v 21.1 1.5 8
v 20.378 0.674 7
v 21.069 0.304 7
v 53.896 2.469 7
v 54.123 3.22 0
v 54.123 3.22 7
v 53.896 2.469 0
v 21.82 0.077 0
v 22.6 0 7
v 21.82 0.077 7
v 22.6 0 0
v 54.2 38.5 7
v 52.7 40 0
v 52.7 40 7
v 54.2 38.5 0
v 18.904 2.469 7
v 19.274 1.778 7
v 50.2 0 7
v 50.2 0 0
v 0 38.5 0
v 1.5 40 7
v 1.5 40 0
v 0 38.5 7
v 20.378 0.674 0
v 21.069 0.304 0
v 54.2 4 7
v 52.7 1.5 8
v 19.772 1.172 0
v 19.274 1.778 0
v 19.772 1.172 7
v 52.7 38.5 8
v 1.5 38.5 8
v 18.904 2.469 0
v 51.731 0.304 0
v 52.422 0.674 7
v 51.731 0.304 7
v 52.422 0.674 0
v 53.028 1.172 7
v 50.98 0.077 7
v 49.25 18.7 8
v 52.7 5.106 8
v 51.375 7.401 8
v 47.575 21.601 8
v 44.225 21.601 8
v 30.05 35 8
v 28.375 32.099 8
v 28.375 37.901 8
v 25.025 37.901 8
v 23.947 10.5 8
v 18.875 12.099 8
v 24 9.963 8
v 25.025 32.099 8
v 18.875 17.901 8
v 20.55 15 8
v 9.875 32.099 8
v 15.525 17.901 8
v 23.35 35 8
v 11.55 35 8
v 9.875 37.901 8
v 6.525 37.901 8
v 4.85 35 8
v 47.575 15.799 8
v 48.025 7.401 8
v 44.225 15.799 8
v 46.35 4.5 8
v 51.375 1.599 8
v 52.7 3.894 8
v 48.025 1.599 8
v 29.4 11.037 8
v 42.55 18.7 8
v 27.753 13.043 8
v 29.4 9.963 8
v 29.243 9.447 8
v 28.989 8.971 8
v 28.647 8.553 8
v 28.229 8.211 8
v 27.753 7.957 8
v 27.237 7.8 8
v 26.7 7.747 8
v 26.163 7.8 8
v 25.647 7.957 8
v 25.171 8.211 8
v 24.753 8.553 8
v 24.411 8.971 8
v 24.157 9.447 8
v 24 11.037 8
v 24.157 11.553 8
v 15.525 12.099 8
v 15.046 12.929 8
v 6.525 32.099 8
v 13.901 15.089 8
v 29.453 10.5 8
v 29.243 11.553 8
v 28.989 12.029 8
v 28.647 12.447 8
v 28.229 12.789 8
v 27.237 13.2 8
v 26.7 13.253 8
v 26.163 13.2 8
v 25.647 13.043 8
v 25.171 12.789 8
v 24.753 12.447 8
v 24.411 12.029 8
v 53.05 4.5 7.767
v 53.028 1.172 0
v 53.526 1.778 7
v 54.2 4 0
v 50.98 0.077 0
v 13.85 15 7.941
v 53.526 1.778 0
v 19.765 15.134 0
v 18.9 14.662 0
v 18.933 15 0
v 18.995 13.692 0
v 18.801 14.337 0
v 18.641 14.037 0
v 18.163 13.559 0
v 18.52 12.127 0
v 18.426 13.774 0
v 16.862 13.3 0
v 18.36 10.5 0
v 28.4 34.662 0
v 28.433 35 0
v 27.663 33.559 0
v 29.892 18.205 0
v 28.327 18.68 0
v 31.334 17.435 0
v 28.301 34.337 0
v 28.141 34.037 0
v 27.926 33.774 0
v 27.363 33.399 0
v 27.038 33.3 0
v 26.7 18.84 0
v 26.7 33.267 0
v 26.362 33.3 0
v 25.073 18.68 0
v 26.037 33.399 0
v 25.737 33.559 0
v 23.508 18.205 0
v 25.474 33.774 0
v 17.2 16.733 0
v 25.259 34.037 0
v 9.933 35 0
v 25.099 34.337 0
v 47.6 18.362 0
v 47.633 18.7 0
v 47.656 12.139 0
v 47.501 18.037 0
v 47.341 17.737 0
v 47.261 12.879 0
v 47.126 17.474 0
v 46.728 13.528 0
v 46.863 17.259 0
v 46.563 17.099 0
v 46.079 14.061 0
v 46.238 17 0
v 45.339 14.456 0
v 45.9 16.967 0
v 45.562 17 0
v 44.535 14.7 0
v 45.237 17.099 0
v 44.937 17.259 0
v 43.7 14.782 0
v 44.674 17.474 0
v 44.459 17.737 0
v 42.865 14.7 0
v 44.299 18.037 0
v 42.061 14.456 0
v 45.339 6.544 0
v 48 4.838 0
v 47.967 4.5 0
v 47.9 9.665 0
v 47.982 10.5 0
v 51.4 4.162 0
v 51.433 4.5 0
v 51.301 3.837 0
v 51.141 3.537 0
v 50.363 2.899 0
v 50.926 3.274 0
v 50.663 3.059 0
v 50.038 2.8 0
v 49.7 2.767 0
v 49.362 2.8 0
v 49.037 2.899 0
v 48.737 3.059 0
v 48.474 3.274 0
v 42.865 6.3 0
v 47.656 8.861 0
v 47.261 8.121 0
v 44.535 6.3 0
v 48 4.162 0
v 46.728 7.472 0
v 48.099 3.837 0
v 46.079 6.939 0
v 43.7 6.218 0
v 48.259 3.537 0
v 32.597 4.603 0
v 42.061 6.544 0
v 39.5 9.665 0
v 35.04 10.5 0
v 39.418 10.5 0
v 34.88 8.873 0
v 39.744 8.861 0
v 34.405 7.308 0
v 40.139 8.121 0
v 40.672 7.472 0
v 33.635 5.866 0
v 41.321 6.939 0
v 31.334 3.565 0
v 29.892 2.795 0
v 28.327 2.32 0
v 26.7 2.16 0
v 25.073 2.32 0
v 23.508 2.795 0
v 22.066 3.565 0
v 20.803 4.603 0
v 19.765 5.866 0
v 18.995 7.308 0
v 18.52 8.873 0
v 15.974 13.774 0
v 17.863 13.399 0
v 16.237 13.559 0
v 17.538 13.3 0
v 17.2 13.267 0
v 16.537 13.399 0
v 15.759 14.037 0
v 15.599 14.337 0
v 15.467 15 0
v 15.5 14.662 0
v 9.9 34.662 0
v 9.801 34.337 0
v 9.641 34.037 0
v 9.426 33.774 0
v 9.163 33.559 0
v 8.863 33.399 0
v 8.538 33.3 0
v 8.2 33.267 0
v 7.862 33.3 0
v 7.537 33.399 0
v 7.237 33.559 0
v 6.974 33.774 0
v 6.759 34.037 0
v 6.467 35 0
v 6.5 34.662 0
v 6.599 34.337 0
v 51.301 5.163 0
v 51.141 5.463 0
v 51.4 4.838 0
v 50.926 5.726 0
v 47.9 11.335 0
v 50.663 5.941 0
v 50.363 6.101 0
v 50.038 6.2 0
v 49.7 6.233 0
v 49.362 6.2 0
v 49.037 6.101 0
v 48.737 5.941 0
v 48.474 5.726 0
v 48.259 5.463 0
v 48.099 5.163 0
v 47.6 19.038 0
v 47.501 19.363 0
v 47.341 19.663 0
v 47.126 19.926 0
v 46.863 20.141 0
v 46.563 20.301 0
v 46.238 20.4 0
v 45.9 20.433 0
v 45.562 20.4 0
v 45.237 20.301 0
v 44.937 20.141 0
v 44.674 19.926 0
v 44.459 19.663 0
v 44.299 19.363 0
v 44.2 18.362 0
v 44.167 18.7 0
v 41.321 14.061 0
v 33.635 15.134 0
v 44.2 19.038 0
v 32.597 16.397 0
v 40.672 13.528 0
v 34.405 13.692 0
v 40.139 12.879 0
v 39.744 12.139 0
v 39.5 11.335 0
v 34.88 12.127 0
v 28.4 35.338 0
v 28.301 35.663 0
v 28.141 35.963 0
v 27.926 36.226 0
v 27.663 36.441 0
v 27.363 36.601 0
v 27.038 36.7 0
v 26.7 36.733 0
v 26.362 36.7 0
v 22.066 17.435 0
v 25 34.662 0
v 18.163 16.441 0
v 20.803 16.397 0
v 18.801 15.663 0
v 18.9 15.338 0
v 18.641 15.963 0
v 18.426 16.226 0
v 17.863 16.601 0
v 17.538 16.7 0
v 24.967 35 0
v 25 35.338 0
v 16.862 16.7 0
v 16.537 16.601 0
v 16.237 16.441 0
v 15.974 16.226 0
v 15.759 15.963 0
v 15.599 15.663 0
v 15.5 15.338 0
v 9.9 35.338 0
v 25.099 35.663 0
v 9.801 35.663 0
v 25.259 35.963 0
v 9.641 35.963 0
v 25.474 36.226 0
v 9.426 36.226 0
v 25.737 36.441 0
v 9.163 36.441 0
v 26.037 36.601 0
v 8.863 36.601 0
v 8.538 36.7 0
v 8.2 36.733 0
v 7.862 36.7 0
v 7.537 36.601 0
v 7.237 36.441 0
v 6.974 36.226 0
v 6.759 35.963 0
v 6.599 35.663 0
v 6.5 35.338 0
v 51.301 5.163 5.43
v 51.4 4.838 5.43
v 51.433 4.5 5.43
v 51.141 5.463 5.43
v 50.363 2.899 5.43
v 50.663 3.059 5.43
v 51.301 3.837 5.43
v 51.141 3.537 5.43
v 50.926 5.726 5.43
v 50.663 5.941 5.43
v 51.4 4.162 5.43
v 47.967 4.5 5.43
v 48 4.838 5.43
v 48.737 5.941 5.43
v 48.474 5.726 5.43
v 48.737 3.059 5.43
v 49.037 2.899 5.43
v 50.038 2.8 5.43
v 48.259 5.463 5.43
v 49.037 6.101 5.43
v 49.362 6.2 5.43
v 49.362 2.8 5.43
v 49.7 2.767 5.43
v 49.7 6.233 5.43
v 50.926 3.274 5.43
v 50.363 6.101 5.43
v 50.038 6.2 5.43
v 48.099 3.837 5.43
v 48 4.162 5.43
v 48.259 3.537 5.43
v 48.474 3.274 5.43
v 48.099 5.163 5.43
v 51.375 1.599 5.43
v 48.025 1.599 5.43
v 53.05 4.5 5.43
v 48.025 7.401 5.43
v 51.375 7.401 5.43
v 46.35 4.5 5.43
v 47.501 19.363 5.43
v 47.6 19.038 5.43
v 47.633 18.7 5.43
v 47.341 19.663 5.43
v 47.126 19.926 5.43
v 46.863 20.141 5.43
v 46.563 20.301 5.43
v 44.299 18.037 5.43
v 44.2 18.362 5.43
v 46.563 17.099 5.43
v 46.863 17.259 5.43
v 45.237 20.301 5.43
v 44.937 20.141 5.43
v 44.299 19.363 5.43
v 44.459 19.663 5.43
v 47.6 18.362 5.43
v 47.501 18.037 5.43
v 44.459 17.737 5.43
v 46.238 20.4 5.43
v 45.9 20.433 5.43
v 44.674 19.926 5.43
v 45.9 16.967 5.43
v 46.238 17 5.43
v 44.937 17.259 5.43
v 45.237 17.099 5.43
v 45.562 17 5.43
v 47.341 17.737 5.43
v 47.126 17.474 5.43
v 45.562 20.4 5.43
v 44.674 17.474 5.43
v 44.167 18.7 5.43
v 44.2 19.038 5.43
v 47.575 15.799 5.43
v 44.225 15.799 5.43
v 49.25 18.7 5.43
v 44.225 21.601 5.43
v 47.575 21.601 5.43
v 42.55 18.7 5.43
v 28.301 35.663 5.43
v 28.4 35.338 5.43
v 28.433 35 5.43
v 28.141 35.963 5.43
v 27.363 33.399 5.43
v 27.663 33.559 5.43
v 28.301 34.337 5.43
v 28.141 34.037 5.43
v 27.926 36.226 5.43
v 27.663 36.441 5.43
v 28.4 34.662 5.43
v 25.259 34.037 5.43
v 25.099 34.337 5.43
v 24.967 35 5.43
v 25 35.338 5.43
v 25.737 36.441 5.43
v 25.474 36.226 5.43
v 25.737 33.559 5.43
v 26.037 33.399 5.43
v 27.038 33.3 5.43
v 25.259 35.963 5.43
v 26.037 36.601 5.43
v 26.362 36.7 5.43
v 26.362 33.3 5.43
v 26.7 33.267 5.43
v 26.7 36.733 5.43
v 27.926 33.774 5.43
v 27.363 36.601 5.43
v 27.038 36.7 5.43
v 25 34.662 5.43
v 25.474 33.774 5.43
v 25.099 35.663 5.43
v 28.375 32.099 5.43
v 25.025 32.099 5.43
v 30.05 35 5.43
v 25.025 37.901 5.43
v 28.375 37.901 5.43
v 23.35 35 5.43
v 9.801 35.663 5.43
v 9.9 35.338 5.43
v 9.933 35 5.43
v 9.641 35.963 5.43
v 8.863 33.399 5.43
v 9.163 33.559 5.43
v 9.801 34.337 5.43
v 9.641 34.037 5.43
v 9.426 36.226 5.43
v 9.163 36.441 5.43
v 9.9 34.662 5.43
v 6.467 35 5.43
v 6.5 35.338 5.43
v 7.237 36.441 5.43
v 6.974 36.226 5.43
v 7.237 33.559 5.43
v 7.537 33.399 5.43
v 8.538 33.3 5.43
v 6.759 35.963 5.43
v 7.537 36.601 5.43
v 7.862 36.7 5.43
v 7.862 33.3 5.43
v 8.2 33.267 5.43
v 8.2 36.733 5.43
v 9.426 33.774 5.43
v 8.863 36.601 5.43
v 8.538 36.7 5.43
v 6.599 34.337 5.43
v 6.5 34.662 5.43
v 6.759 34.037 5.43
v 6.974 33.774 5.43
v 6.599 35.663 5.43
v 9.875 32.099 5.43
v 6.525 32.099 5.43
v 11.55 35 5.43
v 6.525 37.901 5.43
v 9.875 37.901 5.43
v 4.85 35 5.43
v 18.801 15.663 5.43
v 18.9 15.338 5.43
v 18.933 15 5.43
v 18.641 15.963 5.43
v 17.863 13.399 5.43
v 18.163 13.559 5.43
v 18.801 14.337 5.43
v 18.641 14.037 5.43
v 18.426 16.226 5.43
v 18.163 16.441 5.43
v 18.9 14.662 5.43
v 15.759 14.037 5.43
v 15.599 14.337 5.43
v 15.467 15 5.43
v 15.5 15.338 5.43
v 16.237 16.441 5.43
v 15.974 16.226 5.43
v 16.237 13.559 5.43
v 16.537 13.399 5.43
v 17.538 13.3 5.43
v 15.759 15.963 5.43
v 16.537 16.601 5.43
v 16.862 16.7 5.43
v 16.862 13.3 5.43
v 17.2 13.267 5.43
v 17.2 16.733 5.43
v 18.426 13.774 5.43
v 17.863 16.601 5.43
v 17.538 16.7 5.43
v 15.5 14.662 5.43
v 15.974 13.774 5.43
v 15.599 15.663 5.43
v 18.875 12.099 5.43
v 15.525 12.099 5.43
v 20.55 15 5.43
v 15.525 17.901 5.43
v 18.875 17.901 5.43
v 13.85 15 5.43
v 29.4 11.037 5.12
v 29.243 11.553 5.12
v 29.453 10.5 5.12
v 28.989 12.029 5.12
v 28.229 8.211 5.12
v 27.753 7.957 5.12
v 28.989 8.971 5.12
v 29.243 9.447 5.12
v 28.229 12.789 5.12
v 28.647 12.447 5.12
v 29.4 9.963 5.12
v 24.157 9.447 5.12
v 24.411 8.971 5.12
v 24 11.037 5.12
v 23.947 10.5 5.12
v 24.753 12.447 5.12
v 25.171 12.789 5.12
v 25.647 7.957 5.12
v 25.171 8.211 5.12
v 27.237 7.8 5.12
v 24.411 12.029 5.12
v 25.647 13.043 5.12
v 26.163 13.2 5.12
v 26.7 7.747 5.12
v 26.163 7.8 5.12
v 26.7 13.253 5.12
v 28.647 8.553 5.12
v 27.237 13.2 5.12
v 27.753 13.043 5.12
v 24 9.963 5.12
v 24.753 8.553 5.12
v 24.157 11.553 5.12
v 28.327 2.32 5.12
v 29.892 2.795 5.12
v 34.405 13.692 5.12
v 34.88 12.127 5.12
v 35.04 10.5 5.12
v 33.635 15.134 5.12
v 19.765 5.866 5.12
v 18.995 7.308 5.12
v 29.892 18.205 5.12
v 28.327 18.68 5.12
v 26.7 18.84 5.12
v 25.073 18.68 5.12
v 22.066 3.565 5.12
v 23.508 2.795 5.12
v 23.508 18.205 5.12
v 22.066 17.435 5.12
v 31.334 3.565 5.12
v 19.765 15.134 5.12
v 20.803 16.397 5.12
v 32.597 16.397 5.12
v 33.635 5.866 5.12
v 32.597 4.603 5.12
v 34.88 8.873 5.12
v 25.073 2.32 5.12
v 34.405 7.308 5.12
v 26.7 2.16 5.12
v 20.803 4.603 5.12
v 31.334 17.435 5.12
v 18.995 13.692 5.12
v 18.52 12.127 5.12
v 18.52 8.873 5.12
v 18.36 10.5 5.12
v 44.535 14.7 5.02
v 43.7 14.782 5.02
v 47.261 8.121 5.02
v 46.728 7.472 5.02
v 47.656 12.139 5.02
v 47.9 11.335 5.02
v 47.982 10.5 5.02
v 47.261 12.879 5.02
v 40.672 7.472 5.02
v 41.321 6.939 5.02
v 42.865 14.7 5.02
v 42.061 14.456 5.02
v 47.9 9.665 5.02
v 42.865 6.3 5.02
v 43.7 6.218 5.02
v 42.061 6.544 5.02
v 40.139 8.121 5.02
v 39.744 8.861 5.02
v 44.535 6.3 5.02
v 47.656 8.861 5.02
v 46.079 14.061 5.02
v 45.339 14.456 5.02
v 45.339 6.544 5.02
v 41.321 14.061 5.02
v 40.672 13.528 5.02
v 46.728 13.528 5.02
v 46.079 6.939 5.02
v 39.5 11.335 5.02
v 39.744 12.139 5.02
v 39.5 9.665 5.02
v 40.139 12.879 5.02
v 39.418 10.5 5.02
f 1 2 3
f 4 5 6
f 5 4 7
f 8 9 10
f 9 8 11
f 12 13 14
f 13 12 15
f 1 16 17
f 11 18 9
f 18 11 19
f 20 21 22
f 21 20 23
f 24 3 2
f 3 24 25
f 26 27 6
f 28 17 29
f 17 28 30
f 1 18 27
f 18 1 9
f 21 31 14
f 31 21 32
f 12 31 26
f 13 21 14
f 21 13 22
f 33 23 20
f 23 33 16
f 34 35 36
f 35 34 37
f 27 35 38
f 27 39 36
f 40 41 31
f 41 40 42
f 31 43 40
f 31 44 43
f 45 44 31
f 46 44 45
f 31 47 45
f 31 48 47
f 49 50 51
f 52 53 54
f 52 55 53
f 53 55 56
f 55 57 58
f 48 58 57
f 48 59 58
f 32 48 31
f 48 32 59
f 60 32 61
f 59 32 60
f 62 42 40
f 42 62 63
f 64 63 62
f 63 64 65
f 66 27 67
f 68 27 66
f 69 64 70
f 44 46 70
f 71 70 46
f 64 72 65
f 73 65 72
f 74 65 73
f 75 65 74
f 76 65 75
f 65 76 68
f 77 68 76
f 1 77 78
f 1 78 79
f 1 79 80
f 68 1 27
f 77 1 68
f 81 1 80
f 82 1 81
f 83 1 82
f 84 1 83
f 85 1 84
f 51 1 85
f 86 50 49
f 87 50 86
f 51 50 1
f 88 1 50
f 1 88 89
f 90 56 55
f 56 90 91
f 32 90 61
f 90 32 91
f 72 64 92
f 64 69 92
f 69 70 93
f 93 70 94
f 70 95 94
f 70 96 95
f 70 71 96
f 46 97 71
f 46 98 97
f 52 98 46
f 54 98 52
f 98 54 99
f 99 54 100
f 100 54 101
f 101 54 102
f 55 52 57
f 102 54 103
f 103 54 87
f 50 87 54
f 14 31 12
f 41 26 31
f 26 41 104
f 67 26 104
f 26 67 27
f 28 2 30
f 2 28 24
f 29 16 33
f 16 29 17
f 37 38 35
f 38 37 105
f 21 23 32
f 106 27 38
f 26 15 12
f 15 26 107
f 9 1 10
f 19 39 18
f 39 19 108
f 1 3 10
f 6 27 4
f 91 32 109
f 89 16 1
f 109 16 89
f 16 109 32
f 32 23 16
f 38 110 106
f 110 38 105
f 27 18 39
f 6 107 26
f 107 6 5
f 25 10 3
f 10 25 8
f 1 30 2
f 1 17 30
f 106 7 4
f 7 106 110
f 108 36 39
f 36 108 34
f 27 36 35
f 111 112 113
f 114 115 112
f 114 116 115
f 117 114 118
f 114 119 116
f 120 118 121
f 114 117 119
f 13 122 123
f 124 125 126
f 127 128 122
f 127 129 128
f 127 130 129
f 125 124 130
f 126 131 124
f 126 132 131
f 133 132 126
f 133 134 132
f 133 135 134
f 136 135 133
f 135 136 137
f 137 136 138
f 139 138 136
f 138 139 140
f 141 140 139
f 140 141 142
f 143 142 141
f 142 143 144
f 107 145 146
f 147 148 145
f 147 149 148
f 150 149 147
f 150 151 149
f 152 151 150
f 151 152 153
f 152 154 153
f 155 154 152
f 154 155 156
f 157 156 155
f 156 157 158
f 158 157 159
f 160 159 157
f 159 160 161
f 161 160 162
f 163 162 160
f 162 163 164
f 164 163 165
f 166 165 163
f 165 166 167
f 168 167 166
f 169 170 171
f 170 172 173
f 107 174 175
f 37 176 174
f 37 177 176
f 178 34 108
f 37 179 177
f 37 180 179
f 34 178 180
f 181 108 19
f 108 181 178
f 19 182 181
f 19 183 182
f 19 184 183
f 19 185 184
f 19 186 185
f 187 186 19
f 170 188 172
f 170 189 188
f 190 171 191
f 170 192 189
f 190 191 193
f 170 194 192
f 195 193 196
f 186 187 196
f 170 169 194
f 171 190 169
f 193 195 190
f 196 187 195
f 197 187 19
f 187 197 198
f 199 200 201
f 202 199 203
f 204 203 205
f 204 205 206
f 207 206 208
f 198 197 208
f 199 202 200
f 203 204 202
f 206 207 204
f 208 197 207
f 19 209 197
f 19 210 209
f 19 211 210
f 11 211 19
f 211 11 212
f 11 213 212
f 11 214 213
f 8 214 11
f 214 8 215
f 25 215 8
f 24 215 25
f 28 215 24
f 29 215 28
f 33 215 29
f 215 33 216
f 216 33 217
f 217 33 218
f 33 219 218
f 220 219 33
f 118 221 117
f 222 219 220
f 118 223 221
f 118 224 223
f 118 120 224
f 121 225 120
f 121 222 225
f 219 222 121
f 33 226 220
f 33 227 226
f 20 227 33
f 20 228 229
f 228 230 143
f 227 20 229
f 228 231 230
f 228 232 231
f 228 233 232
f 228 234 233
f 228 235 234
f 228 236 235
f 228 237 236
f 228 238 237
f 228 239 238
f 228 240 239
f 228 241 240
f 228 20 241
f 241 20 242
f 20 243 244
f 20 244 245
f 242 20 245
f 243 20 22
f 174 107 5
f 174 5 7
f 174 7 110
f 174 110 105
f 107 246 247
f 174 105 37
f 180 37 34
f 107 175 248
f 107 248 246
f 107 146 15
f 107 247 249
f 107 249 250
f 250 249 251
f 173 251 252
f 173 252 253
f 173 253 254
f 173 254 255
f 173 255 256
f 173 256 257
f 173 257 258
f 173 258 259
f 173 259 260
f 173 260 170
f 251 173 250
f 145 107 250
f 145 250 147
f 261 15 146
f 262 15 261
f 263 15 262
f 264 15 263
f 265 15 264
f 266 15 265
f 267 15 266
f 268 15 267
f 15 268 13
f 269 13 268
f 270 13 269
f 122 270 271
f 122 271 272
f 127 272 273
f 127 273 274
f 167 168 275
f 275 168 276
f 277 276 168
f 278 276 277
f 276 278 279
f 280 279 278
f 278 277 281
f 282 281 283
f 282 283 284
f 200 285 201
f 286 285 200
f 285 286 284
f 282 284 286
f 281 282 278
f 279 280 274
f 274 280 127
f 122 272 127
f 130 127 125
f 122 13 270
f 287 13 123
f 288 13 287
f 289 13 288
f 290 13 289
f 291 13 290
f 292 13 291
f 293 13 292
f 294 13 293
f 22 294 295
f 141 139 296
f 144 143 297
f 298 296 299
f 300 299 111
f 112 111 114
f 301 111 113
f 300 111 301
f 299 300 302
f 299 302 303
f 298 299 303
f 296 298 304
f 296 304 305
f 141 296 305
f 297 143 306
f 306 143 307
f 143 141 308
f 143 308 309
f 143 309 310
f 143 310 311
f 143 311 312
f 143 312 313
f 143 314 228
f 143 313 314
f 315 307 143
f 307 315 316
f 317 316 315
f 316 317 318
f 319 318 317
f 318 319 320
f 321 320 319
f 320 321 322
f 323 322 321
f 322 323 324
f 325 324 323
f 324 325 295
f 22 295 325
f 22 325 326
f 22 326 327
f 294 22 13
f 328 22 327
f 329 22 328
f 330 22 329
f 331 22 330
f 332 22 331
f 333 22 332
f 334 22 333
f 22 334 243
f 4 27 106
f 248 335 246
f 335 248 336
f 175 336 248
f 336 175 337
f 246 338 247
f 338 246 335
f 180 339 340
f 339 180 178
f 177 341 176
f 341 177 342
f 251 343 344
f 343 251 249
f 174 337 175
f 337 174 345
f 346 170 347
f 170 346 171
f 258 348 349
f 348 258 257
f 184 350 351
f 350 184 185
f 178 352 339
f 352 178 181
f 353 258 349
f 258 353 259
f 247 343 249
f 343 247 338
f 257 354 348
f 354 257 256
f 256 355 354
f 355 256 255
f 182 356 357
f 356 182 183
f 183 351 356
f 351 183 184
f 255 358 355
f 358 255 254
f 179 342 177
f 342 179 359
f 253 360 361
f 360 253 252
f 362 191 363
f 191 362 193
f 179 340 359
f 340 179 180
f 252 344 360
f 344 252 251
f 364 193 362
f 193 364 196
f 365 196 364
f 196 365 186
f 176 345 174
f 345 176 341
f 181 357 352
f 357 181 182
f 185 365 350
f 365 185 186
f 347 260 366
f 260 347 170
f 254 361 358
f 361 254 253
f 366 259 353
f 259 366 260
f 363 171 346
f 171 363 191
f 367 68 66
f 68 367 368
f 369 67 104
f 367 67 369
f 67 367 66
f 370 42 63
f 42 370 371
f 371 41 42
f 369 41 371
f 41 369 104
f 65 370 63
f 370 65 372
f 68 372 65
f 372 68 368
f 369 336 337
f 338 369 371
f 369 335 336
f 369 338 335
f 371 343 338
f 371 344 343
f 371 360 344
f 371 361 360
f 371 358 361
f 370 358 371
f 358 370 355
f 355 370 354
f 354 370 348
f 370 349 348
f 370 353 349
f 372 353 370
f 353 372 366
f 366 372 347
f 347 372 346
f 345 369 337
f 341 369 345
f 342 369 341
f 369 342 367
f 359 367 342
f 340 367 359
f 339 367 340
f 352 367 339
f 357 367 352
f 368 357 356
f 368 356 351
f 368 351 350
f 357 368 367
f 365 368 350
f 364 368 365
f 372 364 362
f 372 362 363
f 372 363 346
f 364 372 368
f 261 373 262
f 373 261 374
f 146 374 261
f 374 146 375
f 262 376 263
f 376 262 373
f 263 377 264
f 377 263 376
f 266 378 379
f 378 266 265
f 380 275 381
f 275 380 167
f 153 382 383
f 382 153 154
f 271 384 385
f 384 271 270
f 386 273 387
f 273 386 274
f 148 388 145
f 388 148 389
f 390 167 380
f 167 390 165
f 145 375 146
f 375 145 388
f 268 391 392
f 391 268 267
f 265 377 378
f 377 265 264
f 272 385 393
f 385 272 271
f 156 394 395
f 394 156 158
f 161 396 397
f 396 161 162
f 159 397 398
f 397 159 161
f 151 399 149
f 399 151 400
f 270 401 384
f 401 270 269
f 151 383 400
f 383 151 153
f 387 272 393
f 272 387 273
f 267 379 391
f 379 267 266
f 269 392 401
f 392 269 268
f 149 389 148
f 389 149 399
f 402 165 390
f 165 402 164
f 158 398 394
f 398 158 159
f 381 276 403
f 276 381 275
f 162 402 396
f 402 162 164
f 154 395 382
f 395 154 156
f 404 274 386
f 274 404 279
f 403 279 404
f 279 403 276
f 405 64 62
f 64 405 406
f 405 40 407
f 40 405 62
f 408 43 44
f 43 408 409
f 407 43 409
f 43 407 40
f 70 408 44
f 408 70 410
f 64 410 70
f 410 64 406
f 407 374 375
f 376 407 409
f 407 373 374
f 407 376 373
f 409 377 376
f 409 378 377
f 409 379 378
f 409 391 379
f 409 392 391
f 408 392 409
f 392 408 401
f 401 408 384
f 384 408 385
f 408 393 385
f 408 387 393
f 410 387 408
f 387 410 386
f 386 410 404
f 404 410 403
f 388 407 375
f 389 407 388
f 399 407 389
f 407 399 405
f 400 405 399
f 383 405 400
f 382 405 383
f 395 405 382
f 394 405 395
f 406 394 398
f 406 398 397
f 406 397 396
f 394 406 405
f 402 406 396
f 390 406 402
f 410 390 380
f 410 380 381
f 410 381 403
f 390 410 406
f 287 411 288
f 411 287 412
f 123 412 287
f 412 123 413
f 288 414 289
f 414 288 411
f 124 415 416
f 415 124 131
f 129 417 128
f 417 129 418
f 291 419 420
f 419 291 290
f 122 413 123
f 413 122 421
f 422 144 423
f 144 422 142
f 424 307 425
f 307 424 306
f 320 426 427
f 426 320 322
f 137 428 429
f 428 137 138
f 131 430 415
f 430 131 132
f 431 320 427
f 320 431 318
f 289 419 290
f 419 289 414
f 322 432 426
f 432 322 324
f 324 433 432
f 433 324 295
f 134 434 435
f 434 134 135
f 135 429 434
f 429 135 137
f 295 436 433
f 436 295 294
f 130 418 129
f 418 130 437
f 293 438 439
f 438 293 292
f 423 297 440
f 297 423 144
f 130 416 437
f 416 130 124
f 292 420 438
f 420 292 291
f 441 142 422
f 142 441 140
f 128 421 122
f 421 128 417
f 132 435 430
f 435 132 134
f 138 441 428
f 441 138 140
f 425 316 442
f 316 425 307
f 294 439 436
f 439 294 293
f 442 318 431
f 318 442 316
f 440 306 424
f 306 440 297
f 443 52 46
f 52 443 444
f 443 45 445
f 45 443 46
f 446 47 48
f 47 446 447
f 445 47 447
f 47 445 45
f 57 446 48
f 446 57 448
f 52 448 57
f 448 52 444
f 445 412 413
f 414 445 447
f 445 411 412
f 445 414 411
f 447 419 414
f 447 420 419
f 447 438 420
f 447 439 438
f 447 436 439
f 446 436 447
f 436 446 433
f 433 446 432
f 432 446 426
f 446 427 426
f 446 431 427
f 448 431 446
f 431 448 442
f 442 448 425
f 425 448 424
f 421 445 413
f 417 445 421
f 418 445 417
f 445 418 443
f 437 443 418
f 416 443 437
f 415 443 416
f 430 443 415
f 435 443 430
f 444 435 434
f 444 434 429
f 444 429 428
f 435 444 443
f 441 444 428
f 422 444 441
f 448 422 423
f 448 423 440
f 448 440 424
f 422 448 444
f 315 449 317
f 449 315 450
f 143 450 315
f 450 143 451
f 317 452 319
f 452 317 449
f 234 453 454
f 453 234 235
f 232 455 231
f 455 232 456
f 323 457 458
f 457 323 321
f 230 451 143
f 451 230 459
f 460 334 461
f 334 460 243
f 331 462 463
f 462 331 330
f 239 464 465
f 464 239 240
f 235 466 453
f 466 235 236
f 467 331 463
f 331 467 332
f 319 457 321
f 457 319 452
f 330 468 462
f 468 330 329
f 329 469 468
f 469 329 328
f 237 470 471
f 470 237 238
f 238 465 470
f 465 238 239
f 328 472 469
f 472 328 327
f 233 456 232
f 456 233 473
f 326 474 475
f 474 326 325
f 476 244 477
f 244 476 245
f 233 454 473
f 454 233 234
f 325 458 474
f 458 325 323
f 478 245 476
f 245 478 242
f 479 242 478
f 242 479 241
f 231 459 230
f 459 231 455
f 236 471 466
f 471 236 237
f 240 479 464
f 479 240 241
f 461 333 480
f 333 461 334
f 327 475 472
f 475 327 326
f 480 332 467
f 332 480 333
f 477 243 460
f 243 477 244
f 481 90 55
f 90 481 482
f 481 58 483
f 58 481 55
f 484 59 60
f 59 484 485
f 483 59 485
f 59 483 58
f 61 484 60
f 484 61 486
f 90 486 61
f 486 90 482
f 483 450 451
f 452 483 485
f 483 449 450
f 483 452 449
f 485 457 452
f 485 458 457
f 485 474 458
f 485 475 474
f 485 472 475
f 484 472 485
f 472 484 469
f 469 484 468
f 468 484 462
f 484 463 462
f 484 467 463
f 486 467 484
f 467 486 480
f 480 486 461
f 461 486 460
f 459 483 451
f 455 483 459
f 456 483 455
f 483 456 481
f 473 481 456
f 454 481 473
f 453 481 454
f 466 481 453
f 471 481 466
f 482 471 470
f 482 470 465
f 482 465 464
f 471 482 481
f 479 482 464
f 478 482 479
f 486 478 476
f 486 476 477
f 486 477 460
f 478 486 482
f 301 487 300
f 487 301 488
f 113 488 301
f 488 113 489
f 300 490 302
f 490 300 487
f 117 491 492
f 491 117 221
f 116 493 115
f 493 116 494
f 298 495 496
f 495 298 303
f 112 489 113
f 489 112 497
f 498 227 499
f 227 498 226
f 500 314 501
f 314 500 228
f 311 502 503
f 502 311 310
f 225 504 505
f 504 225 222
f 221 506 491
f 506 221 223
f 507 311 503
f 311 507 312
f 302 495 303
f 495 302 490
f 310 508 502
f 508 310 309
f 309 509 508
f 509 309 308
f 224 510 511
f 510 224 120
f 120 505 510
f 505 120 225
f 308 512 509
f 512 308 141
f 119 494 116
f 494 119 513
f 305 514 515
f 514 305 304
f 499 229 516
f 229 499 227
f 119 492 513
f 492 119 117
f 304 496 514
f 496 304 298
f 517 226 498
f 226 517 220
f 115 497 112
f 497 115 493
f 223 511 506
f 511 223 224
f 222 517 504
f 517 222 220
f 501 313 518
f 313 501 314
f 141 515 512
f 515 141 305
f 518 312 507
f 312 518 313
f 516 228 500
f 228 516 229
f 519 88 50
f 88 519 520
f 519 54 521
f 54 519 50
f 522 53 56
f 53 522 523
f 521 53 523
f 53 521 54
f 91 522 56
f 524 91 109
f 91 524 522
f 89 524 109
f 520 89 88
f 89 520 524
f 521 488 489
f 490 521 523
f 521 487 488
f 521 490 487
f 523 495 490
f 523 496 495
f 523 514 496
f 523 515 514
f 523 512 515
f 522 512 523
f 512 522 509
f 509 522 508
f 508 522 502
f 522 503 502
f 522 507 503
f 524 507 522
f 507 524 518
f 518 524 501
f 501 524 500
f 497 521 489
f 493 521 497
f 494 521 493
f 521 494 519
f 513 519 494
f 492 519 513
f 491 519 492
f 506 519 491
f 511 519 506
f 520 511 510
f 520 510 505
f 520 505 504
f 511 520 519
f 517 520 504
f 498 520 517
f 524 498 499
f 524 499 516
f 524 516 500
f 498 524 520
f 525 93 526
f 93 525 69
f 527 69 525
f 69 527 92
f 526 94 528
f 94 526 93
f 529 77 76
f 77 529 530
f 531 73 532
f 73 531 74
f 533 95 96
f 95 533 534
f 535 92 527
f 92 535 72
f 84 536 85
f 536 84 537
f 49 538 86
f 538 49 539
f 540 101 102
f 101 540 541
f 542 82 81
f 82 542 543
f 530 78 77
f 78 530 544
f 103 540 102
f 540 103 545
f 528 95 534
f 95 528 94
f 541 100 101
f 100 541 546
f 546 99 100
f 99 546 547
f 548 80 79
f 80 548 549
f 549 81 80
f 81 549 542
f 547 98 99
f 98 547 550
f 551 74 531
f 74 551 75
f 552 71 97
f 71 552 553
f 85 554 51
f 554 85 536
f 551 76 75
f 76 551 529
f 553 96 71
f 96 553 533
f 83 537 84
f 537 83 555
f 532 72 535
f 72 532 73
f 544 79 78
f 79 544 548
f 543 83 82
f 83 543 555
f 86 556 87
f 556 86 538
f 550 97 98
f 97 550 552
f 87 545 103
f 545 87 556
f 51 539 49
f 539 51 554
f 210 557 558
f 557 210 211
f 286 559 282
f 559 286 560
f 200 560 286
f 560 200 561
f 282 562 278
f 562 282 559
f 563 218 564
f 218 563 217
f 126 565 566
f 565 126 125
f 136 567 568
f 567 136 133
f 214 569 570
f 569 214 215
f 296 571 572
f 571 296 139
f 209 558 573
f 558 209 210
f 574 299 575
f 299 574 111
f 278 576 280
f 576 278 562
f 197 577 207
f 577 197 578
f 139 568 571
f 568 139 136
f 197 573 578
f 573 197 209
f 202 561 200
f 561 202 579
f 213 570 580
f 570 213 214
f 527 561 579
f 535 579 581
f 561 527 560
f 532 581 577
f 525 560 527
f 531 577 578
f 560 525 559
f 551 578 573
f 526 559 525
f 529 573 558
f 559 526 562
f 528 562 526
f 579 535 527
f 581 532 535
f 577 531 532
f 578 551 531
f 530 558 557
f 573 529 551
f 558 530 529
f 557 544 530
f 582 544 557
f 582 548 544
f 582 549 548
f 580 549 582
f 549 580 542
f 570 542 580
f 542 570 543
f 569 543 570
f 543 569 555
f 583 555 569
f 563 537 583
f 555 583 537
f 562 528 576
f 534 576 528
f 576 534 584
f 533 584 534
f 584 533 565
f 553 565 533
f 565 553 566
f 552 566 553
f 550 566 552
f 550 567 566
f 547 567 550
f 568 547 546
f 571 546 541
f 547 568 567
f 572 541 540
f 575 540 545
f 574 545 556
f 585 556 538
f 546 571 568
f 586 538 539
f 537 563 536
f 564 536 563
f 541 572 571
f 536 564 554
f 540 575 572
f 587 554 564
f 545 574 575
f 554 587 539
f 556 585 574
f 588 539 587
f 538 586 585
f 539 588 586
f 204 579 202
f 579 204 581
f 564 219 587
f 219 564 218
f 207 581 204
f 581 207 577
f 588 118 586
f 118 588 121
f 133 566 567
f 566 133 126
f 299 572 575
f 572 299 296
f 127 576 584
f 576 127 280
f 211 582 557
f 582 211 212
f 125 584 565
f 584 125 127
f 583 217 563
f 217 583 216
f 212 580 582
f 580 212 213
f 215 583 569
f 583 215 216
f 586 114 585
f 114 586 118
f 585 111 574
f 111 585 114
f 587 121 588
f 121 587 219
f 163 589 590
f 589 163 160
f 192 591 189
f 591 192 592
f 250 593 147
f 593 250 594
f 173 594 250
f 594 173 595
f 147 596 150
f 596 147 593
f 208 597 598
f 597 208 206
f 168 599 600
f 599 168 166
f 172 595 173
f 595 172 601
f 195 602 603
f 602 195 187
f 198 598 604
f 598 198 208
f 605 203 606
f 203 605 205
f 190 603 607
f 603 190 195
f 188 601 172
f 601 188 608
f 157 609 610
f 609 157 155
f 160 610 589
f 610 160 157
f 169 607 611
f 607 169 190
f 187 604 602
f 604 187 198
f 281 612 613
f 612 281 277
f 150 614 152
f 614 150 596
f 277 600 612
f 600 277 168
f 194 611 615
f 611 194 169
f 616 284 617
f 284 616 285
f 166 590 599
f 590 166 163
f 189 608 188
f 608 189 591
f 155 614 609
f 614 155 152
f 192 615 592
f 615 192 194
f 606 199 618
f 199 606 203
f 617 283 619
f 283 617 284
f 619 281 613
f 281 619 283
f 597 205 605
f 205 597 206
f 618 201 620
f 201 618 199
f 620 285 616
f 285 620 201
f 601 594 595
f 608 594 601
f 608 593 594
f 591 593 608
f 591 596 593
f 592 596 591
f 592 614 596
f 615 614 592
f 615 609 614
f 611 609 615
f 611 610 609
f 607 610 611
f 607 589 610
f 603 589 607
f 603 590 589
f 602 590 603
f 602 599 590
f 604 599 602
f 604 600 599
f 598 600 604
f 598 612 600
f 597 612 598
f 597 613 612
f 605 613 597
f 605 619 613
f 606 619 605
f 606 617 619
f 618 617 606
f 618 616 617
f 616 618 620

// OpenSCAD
//////////////////////////////////////////////////////////////////////////////////////
///
///  Z-axis - top end - for FRAME Prusa i3 compatible
///
//////////////////////////////////////////////////////////////////////////////////////
///
///  2016-04-21 bfj@bflm.eu, Czech Republic
///
///  released under Creative Commons - Attribution - Share Alike licence (CC BY-SA)
//////////////////////////////////////////////////////////////////////////////////////

/*[dimensions]*/
bearing_tolerance = 0.18;
hole_tolerance = 0.2;
nut_tolerance = 0.15;
pos = 0;//[0:Right,1:Left]


/*[hidden]*/
width = 54.2;
height = 8;
depth = 40;
front_width = 34.6;
tolerance = 0.02;
//for next frame generation 
screw=3;//[3,4,5]
m=5;//[5,6,8]

//Based on: http://www.roymech.co.uk/Useful_Tables/Screws/Hex_Screws.htm
METRIC_NUT_AC_WIDTHS =
[
	-1, //0 index is not used but reduces computation
	-1,
	-1,
	6.40,//m3
	8.10,//m4
	9.20,//m5
	11.50,//m6
	-1,
	15.00,//m8
	-1,
	19.60,//m10
	-1,
	22.10,//m12
	-1,
	-1,
	-1,
	27.70,//m16
	-1,
	-1,
	-1,
	34.60,//m20
	-1,
	-1,
	-1,
	41.60,//m24
	-1,
	-1,
	-1,
	-1,
	-1,
	53.1,//m30
	-1,
	-1,
	-1,
	-1,
	-1,
	63.5//m36
];
METRIC_NUT_THICKNESS =
[
	-1, //0 index is not used but reduces computation
	-1,
	-1,
	2.40,//m3
	3.20,//m4
	4.00,//m5
	5.00,//m6
	-1,
	6.50,//m8
	-1,
	8.00,//m10
	-1,
	10.00,//m12
	-1,
	-1,
	-1,
	13.00,//m16
	-1,
	-1,
	-1,
	16.00//m20
	-1,
	-1,
	-1,
	19.00,//m24
	-1,
	-1,
	-1,
	-1,
	-1,
	24.00,//m30
	-1,
	-1,
	-1,
	-1,
	-1,
	29.00//m36
];



bearing_623 = [10, 4, 3 ];
bearing_624 = [13, 5, 4];
bearing_625 = [16, 5, 5];
bearing_626 = [19, 6, 6];
bearing_608 = [22, 7, 8];

bearing= bearing_625;
if(m==6){
    bearing= bearing_626;
} else if (m==8){
    bearing= bearing_608;
}

function reduction_hole(r, fn) = r/cos(360/fn);


//main box
module chamfered_main_box(h,d=[1,1,1]){
//z-box points    
a0 = [[width-front_width+d[0],+d[1]],[width-d[0],+d[1]],[width-d[0],depth-d[1]],[+d[0],depth-d[1]]];
//x-box points
a1 = [[width-front_width,+d[1]+4],[width,+d[1]+4],[width,depth-d[1]],[0,depth-d[1]]];
//y-box points
a2 = [[width-front_width+d[0]+4,0],[width-d[0]-4,0],[width-d[0],depth],[+d[0],depth]];
//path
pa0=[[0,1,2,3]];
hull(){
        //z-box
        linear_extrude(h) polygon(a0,pa0);
        //x-box
        linear_extrude(h-d[2]) polygon(a1,pa0);
        //y-box
        linear_extrude(h-d[2]) polygon(a2,pa0);
        //front corner
        translate([width-front_width+3,4,0])cylinder(r=4,h=h-d[2],$fn=32);
        //front corner ortogonal
        translate([width-4,4,0])cylinder(r=4,h=h-d[2],$fn=32);
        }

}



//final module
module top_end(){

difference(){
//main box    
chamfered_main_box(height,[1.5,1.5,1]);
//screw holes
translate([width-4.5,4.5,-tolerance])cylinder(r=reduction_hole(screw/2+hole_tolerance,32),h=height+2*tolerance,$fn=32); 
translate([width-4.5,4.5,height-tolerance-nut_tolerance-METRIC_NUT_THICKNESS[screw]])cylinder(r=METRIC_NUT_AC_WIDTHS[screw]/2+nut_tolerance,h=METRIC_NUT_THICKNESS[screw]+2*nut_tolerance,$fn=6);      
translate([width-8.3,18.7,-tolerance])cylinder(r=reduction_hole(screw/2+hole_tolerance,32),h=height+2*tolerance,$fn=32);
 translate([width-8.3,18.7,height-tolerance-nut_tolerance-METRIC_NUT_THICKNESS[screw]])cylinder(r=METRIC_NUT_AC_WIDTHS[screw]/2+nut_tolerance,h=METRIC_NUT_THICKNESS[screw]+2*nut_tolerance,$fn=6);
translate([width-27.5,35,-tolerance])cylinder(r=reduction_hole(screw/2+hole_tolerance,32),h=height+2*tolerance,$fn=32); 
translate([width-27.5,35,height-tolerance-nut_tolerance-METRIC_NUT_THICKNESS[screw]])cylinder(r=METRIC_NUT_AC_WIDTHS[screw]/2+nut_tolerance,h=METRIC_NUT_THICKNESS[screw]+2*nut_tolerance,$fn=6);
translate([width-46,35,-tolerance])cylinder(r=reduction_hole(screw/2+hole_tolerance,32),h=height+2*tolerance,$fn=32); 
translate([width-46,35,height-tolerance-nut_tolerance-METRIC_NUT_THICKNESS[screw]])cylinder(r=METRIC_NUT_AC_WIDTHS[screw]/2+nut_tolerance,h=METRIC_NUT_THICKNESS[screw]+2*nut_tolerance,$fn=6);    
translate([width-37,15,-tolerance])cylinder(r=reduction_hole(screw/2+hole_tolerance,32),h=height+2*tolerance,$fn=32); 
translate([width-37,15,height-tolerance-nut_tolerance-METRIC_NUT_THICKNESS[screw]])cylinder(r=METRIC_NUT_AC_WIDTHS[screw]/2+nut_tolerance,h=METRIC_NUT_THICKNESS[screw]+2*nut_tolerance,$fn=6);    
//----    
//M5 threaded rod hole    
translate([width-27.5,10.5,-tolerance])cylinder(r=reduction_hole(m/2+hole_tolerance,32),h=height+2*tolerance,$fn=32);
//625zz bearing hole
translate([width-27.5,10.5,-tolerance])cylinder(r=reduction_hole(bearing[0]/2+bearing_tolerance, 32),h=bearing[1]+2*tolerance+0.1,$fn=32);
//M8 smooth rod hole   
translate([width-10.5,10.5,-tolerance])cylinder(r=reduction_hole(8/2+hole_tolerance,32),h=5+2*tolerance,$fn=32);
     }      
    
}

if(pos == 1){
    mirror([1,0,0]) top_end();
     /*translate([122.5-width,+40+26+34.15,0])rotate([180,0,270]){
        import("stop_warp_Virsus_Tvirtinimas_1.stl");
    }*/
} else {
    top_end();
   /*translate([width,+40+26+34.15,0])rotate([180,0,270]){
      import("stop_warp_Virsus_Tvirtinimas_2.stl");
   }*/
}
